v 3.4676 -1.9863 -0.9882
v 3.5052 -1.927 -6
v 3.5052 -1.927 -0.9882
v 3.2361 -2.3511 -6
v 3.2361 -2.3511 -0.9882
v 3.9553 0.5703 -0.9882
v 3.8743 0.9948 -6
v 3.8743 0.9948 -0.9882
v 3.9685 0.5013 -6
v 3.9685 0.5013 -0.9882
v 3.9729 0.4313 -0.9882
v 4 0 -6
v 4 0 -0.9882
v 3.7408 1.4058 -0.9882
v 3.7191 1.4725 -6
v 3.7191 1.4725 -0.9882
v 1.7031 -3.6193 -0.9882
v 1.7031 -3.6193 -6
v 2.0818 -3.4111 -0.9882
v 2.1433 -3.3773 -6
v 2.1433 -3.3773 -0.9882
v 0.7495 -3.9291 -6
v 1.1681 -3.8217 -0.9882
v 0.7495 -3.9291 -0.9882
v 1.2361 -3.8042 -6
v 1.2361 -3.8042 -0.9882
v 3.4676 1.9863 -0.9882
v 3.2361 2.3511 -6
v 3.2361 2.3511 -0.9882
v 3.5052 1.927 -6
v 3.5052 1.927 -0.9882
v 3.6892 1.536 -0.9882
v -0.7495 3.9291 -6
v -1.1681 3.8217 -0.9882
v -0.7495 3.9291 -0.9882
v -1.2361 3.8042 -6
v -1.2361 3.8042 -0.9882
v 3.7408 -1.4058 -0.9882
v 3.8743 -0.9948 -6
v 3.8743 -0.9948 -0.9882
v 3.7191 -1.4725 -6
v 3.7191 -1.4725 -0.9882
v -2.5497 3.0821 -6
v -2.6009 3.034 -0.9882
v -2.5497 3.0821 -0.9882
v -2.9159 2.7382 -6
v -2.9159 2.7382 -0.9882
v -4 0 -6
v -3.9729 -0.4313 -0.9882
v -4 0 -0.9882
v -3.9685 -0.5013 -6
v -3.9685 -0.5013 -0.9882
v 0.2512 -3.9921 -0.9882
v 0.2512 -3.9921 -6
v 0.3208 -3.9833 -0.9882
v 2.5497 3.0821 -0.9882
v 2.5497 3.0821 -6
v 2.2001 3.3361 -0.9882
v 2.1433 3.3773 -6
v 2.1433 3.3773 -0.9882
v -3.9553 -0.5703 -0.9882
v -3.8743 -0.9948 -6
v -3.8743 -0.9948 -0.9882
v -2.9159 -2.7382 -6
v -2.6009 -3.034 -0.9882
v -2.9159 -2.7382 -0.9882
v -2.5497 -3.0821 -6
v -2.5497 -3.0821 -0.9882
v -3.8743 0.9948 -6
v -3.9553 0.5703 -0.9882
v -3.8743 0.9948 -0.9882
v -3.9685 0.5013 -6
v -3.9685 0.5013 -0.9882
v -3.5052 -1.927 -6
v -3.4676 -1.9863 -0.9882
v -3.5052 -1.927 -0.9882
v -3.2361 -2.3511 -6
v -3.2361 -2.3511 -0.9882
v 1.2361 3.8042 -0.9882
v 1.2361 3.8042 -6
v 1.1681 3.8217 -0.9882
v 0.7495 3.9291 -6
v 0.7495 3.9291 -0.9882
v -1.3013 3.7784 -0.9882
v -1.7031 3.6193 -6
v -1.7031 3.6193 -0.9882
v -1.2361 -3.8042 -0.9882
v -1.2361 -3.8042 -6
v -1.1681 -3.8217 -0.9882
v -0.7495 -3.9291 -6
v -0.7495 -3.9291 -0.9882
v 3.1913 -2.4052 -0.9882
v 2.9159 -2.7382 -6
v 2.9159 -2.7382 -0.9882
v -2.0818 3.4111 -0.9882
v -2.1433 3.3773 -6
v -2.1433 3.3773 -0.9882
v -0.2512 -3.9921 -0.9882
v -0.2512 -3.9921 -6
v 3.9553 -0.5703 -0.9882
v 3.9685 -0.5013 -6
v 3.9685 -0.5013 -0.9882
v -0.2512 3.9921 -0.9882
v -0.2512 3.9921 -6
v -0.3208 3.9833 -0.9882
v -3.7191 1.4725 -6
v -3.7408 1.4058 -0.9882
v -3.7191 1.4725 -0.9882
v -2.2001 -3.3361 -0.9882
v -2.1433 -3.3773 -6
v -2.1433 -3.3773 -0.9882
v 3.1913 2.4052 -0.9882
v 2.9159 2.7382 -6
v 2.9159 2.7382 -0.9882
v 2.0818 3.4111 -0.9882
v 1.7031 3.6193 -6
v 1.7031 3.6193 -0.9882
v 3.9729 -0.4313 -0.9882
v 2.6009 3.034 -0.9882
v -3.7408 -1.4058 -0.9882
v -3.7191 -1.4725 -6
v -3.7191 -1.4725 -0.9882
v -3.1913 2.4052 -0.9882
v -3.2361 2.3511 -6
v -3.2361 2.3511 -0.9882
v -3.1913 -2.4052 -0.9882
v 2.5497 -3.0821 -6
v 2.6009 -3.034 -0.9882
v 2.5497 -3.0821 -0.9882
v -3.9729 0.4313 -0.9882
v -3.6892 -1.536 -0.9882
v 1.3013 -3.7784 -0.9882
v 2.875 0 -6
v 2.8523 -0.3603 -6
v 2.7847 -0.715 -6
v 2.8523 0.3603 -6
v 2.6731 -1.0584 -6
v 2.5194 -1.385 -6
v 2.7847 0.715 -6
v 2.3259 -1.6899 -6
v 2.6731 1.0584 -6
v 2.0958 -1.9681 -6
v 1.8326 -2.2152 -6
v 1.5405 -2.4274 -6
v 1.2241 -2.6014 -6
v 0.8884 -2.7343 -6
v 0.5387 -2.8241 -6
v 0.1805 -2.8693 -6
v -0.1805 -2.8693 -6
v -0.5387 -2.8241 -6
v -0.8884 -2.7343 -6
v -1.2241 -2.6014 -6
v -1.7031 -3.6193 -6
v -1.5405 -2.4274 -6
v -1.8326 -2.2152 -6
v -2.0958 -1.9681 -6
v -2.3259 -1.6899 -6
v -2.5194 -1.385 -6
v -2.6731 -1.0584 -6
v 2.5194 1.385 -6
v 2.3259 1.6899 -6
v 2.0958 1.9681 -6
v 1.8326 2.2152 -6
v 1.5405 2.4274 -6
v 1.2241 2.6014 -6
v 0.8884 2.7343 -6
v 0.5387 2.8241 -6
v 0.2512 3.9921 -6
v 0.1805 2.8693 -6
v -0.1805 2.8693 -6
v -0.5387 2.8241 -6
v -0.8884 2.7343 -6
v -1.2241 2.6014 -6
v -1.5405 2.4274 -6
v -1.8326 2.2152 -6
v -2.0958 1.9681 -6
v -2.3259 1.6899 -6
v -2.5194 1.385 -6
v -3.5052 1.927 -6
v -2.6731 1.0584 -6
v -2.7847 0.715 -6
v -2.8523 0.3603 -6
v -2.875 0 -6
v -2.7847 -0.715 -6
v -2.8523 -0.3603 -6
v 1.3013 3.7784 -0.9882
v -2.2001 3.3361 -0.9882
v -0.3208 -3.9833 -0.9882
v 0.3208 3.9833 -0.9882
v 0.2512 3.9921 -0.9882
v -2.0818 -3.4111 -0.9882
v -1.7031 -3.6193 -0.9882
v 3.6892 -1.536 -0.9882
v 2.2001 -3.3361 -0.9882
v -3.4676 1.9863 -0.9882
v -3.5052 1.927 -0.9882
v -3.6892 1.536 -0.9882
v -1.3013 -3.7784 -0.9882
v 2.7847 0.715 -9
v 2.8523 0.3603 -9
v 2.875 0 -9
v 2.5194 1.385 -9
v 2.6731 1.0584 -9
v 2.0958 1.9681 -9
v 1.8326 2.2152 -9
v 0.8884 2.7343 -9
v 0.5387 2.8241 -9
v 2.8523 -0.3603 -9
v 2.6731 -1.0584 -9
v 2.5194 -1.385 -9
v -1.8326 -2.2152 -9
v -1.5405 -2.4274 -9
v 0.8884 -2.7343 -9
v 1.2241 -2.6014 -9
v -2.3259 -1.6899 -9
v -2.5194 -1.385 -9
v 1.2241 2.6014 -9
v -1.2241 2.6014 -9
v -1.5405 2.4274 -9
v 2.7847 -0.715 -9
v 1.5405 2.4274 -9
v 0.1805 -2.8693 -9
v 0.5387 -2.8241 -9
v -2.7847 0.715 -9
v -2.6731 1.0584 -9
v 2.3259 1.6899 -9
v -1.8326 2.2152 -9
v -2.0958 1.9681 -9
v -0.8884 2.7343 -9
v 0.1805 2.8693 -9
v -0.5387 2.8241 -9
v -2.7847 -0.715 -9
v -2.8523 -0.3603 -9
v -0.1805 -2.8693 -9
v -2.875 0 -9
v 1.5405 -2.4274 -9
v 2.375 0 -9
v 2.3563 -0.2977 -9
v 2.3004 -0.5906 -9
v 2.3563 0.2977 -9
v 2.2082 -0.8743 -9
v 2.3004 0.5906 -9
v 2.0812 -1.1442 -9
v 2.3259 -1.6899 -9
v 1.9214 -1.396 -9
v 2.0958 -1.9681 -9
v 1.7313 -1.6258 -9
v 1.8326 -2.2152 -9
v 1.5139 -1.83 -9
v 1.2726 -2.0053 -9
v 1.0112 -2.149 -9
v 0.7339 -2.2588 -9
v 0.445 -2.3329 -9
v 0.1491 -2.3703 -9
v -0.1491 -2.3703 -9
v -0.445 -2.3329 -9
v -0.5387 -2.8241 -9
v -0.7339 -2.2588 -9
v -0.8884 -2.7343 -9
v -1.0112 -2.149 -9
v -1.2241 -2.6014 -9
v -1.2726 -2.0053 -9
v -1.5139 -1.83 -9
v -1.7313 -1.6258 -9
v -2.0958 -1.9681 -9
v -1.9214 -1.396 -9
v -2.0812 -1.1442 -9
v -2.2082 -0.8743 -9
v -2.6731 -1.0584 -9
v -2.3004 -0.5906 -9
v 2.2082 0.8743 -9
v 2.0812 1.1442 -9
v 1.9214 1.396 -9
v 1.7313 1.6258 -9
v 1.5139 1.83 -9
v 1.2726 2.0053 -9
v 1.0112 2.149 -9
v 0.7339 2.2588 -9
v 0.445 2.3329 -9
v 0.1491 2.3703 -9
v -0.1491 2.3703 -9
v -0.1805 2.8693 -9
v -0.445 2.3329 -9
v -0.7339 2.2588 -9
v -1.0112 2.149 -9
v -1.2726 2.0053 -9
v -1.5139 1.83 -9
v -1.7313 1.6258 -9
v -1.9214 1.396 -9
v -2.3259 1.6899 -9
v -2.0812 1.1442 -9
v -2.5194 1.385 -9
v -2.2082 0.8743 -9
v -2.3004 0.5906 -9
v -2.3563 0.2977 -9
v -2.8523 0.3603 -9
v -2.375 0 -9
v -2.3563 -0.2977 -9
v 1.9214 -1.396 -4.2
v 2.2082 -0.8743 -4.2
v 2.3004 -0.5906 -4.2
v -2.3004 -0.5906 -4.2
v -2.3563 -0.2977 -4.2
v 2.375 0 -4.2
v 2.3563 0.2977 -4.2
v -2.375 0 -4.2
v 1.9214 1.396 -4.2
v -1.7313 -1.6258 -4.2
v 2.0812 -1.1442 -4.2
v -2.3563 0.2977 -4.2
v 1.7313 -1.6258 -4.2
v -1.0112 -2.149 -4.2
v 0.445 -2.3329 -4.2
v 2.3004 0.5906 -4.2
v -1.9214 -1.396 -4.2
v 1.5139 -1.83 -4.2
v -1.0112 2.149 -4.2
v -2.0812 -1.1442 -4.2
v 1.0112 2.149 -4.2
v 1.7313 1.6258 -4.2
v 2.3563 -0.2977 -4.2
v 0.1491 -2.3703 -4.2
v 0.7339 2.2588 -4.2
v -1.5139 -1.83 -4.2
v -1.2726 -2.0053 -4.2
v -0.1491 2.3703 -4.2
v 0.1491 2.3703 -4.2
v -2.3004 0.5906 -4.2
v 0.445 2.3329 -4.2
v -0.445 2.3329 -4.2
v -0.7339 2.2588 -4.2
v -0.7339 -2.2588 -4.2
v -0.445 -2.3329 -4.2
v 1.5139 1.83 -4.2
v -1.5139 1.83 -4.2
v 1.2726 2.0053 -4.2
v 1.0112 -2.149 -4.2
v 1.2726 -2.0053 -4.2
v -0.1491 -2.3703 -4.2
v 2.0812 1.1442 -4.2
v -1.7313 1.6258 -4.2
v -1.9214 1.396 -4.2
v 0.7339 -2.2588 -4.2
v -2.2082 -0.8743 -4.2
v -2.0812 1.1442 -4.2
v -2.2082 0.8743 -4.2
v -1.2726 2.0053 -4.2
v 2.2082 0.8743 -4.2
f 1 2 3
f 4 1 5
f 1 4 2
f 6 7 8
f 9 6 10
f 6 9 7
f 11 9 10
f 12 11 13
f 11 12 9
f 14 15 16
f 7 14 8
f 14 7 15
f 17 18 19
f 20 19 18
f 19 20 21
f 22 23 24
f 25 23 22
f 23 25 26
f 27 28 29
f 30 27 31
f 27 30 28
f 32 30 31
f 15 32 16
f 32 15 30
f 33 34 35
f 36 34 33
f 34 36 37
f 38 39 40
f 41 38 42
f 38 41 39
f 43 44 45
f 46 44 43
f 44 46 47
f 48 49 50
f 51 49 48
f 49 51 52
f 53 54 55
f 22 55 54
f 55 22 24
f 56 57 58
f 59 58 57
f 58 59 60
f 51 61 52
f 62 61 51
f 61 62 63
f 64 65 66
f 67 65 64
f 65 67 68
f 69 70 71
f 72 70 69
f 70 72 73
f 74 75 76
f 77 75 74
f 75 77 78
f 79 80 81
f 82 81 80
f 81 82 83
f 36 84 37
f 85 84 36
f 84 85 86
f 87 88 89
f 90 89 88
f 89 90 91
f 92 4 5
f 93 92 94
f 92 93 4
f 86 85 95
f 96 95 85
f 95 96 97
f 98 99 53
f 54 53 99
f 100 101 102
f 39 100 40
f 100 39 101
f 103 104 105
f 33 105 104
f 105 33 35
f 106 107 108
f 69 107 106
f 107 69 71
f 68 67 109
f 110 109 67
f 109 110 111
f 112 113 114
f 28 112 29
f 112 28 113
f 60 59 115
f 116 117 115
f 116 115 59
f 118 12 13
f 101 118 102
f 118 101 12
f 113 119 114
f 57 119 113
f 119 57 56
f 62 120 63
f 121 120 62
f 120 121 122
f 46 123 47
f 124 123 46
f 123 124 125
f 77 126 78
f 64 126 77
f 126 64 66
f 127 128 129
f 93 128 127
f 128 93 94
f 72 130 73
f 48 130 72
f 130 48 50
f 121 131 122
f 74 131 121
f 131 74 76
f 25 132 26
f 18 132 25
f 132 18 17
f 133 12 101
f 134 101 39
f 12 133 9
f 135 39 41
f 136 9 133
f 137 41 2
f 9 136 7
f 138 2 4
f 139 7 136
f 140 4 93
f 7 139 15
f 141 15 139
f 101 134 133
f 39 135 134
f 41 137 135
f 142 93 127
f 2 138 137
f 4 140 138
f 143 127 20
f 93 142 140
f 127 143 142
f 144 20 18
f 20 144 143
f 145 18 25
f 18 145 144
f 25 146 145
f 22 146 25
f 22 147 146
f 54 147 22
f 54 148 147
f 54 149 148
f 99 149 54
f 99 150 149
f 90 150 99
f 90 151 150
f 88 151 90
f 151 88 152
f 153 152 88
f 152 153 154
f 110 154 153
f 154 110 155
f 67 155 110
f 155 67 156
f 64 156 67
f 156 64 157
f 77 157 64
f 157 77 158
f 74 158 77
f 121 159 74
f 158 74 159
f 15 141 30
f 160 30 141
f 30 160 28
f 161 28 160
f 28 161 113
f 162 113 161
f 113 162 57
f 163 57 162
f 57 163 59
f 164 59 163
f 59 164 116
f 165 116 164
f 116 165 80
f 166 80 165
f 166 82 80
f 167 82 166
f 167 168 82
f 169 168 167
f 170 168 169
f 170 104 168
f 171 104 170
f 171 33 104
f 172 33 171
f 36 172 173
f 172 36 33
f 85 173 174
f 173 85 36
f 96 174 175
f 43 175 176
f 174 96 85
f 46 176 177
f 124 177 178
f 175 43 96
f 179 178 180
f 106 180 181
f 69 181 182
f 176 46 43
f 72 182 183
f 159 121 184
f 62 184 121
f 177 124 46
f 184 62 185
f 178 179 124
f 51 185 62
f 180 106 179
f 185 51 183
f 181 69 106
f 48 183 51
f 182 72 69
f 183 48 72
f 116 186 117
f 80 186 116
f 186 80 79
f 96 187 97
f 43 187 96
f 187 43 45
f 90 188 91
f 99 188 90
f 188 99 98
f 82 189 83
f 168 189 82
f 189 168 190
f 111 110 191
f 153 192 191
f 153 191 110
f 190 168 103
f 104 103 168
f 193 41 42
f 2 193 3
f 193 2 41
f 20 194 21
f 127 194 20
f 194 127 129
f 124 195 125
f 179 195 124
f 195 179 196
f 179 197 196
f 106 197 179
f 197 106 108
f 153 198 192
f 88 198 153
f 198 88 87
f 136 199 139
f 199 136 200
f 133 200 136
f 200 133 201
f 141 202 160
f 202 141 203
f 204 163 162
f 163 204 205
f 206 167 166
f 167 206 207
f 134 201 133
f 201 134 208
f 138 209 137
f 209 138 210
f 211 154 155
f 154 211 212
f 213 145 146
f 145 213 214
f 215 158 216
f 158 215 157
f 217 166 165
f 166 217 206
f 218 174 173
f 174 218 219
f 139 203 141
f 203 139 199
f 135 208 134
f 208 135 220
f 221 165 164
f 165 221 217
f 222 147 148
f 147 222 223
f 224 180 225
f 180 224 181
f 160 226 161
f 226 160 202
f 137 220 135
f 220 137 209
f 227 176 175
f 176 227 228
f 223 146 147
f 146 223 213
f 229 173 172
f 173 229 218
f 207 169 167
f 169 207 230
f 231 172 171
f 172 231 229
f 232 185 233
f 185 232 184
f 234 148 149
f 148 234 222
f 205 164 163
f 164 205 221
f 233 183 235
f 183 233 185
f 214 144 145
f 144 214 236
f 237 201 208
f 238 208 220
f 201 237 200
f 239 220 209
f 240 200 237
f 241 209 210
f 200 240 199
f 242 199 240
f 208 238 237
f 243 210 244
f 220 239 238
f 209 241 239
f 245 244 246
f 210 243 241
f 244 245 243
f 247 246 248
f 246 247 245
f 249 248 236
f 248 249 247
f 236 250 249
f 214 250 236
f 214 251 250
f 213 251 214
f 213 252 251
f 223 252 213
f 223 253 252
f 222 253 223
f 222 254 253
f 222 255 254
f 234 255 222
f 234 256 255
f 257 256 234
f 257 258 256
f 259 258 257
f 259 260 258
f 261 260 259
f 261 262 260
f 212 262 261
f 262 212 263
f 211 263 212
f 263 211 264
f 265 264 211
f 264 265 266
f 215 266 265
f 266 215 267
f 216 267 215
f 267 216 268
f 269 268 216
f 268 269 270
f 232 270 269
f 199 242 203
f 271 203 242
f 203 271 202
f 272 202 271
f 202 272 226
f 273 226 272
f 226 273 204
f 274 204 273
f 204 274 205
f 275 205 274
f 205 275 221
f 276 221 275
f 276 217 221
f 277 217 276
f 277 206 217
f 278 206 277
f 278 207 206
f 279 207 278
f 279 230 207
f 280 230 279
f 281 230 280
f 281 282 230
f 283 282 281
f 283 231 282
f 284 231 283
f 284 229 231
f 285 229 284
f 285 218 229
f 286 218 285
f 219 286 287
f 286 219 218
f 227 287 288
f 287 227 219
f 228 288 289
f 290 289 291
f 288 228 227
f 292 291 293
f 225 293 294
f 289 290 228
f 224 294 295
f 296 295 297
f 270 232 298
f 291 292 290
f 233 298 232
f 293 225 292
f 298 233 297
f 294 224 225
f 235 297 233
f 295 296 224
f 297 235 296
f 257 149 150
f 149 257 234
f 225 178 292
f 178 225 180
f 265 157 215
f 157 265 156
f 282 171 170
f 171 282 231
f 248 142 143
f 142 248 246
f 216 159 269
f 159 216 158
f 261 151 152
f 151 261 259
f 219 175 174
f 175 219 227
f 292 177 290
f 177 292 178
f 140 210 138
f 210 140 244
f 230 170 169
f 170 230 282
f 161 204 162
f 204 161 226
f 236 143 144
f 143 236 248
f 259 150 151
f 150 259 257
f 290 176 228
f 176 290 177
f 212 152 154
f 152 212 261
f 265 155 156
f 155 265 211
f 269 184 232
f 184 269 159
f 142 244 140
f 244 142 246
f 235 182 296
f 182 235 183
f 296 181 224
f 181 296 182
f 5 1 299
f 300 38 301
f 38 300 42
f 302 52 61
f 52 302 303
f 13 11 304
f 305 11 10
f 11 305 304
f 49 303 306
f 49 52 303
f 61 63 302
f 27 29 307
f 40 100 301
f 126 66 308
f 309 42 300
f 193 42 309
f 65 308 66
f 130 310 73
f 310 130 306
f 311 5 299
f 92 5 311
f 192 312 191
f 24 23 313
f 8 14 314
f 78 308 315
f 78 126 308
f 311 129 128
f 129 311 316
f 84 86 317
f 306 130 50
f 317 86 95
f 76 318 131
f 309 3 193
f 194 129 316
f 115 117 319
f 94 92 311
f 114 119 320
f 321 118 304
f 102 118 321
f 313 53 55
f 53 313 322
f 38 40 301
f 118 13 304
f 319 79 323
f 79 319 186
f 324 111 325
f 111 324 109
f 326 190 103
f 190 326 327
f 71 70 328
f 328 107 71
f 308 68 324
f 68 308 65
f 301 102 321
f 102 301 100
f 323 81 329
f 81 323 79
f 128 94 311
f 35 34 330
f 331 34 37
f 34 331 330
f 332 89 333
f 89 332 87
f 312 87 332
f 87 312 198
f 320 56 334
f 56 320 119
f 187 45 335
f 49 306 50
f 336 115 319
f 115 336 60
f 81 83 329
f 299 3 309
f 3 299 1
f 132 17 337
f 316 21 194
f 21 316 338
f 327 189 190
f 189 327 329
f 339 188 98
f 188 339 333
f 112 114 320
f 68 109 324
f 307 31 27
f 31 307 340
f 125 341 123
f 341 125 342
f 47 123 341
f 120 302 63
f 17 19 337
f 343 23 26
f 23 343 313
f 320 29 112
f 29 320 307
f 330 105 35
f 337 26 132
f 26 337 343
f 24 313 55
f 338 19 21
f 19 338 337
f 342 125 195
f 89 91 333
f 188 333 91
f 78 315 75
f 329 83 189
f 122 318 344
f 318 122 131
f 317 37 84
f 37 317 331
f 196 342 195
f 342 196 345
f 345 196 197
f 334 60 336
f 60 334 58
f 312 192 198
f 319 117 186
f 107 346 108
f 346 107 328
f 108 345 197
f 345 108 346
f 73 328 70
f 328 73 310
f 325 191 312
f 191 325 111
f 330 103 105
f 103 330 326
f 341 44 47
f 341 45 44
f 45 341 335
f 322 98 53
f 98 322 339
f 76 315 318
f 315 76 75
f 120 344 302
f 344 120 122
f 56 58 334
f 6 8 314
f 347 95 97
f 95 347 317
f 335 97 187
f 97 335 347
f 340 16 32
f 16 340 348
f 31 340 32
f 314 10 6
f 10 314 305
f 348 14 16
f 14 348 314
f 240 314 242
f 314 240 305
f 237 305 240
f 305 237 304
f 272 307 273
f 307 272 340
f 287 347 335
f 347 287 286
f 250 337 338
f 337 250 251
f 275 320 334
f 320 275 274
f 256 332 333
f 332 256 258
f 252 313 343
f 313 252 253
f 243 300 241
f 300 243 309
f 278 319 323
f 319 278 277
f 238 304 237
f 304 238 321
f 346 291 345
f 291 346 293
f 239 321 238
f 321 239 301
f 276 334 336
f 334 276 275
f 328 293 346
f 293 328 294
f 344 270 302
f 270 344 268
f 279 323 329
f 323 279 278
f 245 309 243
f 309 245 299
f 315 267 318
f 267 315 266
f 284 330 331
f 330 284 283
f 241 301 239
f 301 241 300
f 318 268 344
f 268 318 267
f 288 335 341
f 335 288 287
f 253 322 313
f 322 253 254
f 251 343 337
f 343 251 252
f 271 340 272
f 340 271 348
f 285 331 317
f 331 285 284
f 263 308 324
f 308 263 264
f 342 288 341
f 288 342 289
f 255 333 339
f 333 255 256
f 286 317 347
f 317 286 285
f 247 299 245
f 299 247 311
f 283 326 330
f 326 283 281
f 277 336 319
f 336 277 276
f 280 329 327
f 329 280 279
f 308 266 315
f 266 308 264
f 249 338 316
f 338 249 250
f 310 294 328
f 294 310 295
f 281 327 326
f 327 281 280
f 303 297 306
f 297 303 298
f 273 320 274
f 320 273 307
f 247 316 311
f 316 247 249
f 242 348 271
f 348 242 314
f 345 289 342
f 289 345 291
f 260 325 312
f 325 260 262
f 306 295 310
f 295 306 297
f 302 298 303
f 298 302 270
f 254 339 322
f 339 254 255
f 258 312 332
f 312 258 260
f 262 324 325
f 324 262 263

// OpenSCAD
$fn = 50;

difference() {
	union() {
		translate(v = [0, 0, -6.0]) {
			cylinder(h = 6, r = 4.0);
		}
		#translate(v = [0, 0, -9.0]) {
			cylinder(h = 9, r = 2.875);
		}
	}
	union() {
		translate(v = [0, 0, 0]) {
			rotate(a = [0, 0, 0]) {
				difference() {
					union() {
						translate(v = [0, 0, -9.0]) {
							cylinder(h = 9, r = 2.25);
						}
						translate(v = [0, 0, -4.2]) {
							cylinder(h = 4.2, r1 = 2.375, r2 = 4.5);
						}
						translate(v = [0, 0, -9.0]) {
							cylinder(h = 9, r = 2.375);
						}
						translate(v = [0, 0, -9.0]) {
							cylinder(h = 9, r = 2.25);
						}
					}
					union();
				}
			}
		}
	}
}
